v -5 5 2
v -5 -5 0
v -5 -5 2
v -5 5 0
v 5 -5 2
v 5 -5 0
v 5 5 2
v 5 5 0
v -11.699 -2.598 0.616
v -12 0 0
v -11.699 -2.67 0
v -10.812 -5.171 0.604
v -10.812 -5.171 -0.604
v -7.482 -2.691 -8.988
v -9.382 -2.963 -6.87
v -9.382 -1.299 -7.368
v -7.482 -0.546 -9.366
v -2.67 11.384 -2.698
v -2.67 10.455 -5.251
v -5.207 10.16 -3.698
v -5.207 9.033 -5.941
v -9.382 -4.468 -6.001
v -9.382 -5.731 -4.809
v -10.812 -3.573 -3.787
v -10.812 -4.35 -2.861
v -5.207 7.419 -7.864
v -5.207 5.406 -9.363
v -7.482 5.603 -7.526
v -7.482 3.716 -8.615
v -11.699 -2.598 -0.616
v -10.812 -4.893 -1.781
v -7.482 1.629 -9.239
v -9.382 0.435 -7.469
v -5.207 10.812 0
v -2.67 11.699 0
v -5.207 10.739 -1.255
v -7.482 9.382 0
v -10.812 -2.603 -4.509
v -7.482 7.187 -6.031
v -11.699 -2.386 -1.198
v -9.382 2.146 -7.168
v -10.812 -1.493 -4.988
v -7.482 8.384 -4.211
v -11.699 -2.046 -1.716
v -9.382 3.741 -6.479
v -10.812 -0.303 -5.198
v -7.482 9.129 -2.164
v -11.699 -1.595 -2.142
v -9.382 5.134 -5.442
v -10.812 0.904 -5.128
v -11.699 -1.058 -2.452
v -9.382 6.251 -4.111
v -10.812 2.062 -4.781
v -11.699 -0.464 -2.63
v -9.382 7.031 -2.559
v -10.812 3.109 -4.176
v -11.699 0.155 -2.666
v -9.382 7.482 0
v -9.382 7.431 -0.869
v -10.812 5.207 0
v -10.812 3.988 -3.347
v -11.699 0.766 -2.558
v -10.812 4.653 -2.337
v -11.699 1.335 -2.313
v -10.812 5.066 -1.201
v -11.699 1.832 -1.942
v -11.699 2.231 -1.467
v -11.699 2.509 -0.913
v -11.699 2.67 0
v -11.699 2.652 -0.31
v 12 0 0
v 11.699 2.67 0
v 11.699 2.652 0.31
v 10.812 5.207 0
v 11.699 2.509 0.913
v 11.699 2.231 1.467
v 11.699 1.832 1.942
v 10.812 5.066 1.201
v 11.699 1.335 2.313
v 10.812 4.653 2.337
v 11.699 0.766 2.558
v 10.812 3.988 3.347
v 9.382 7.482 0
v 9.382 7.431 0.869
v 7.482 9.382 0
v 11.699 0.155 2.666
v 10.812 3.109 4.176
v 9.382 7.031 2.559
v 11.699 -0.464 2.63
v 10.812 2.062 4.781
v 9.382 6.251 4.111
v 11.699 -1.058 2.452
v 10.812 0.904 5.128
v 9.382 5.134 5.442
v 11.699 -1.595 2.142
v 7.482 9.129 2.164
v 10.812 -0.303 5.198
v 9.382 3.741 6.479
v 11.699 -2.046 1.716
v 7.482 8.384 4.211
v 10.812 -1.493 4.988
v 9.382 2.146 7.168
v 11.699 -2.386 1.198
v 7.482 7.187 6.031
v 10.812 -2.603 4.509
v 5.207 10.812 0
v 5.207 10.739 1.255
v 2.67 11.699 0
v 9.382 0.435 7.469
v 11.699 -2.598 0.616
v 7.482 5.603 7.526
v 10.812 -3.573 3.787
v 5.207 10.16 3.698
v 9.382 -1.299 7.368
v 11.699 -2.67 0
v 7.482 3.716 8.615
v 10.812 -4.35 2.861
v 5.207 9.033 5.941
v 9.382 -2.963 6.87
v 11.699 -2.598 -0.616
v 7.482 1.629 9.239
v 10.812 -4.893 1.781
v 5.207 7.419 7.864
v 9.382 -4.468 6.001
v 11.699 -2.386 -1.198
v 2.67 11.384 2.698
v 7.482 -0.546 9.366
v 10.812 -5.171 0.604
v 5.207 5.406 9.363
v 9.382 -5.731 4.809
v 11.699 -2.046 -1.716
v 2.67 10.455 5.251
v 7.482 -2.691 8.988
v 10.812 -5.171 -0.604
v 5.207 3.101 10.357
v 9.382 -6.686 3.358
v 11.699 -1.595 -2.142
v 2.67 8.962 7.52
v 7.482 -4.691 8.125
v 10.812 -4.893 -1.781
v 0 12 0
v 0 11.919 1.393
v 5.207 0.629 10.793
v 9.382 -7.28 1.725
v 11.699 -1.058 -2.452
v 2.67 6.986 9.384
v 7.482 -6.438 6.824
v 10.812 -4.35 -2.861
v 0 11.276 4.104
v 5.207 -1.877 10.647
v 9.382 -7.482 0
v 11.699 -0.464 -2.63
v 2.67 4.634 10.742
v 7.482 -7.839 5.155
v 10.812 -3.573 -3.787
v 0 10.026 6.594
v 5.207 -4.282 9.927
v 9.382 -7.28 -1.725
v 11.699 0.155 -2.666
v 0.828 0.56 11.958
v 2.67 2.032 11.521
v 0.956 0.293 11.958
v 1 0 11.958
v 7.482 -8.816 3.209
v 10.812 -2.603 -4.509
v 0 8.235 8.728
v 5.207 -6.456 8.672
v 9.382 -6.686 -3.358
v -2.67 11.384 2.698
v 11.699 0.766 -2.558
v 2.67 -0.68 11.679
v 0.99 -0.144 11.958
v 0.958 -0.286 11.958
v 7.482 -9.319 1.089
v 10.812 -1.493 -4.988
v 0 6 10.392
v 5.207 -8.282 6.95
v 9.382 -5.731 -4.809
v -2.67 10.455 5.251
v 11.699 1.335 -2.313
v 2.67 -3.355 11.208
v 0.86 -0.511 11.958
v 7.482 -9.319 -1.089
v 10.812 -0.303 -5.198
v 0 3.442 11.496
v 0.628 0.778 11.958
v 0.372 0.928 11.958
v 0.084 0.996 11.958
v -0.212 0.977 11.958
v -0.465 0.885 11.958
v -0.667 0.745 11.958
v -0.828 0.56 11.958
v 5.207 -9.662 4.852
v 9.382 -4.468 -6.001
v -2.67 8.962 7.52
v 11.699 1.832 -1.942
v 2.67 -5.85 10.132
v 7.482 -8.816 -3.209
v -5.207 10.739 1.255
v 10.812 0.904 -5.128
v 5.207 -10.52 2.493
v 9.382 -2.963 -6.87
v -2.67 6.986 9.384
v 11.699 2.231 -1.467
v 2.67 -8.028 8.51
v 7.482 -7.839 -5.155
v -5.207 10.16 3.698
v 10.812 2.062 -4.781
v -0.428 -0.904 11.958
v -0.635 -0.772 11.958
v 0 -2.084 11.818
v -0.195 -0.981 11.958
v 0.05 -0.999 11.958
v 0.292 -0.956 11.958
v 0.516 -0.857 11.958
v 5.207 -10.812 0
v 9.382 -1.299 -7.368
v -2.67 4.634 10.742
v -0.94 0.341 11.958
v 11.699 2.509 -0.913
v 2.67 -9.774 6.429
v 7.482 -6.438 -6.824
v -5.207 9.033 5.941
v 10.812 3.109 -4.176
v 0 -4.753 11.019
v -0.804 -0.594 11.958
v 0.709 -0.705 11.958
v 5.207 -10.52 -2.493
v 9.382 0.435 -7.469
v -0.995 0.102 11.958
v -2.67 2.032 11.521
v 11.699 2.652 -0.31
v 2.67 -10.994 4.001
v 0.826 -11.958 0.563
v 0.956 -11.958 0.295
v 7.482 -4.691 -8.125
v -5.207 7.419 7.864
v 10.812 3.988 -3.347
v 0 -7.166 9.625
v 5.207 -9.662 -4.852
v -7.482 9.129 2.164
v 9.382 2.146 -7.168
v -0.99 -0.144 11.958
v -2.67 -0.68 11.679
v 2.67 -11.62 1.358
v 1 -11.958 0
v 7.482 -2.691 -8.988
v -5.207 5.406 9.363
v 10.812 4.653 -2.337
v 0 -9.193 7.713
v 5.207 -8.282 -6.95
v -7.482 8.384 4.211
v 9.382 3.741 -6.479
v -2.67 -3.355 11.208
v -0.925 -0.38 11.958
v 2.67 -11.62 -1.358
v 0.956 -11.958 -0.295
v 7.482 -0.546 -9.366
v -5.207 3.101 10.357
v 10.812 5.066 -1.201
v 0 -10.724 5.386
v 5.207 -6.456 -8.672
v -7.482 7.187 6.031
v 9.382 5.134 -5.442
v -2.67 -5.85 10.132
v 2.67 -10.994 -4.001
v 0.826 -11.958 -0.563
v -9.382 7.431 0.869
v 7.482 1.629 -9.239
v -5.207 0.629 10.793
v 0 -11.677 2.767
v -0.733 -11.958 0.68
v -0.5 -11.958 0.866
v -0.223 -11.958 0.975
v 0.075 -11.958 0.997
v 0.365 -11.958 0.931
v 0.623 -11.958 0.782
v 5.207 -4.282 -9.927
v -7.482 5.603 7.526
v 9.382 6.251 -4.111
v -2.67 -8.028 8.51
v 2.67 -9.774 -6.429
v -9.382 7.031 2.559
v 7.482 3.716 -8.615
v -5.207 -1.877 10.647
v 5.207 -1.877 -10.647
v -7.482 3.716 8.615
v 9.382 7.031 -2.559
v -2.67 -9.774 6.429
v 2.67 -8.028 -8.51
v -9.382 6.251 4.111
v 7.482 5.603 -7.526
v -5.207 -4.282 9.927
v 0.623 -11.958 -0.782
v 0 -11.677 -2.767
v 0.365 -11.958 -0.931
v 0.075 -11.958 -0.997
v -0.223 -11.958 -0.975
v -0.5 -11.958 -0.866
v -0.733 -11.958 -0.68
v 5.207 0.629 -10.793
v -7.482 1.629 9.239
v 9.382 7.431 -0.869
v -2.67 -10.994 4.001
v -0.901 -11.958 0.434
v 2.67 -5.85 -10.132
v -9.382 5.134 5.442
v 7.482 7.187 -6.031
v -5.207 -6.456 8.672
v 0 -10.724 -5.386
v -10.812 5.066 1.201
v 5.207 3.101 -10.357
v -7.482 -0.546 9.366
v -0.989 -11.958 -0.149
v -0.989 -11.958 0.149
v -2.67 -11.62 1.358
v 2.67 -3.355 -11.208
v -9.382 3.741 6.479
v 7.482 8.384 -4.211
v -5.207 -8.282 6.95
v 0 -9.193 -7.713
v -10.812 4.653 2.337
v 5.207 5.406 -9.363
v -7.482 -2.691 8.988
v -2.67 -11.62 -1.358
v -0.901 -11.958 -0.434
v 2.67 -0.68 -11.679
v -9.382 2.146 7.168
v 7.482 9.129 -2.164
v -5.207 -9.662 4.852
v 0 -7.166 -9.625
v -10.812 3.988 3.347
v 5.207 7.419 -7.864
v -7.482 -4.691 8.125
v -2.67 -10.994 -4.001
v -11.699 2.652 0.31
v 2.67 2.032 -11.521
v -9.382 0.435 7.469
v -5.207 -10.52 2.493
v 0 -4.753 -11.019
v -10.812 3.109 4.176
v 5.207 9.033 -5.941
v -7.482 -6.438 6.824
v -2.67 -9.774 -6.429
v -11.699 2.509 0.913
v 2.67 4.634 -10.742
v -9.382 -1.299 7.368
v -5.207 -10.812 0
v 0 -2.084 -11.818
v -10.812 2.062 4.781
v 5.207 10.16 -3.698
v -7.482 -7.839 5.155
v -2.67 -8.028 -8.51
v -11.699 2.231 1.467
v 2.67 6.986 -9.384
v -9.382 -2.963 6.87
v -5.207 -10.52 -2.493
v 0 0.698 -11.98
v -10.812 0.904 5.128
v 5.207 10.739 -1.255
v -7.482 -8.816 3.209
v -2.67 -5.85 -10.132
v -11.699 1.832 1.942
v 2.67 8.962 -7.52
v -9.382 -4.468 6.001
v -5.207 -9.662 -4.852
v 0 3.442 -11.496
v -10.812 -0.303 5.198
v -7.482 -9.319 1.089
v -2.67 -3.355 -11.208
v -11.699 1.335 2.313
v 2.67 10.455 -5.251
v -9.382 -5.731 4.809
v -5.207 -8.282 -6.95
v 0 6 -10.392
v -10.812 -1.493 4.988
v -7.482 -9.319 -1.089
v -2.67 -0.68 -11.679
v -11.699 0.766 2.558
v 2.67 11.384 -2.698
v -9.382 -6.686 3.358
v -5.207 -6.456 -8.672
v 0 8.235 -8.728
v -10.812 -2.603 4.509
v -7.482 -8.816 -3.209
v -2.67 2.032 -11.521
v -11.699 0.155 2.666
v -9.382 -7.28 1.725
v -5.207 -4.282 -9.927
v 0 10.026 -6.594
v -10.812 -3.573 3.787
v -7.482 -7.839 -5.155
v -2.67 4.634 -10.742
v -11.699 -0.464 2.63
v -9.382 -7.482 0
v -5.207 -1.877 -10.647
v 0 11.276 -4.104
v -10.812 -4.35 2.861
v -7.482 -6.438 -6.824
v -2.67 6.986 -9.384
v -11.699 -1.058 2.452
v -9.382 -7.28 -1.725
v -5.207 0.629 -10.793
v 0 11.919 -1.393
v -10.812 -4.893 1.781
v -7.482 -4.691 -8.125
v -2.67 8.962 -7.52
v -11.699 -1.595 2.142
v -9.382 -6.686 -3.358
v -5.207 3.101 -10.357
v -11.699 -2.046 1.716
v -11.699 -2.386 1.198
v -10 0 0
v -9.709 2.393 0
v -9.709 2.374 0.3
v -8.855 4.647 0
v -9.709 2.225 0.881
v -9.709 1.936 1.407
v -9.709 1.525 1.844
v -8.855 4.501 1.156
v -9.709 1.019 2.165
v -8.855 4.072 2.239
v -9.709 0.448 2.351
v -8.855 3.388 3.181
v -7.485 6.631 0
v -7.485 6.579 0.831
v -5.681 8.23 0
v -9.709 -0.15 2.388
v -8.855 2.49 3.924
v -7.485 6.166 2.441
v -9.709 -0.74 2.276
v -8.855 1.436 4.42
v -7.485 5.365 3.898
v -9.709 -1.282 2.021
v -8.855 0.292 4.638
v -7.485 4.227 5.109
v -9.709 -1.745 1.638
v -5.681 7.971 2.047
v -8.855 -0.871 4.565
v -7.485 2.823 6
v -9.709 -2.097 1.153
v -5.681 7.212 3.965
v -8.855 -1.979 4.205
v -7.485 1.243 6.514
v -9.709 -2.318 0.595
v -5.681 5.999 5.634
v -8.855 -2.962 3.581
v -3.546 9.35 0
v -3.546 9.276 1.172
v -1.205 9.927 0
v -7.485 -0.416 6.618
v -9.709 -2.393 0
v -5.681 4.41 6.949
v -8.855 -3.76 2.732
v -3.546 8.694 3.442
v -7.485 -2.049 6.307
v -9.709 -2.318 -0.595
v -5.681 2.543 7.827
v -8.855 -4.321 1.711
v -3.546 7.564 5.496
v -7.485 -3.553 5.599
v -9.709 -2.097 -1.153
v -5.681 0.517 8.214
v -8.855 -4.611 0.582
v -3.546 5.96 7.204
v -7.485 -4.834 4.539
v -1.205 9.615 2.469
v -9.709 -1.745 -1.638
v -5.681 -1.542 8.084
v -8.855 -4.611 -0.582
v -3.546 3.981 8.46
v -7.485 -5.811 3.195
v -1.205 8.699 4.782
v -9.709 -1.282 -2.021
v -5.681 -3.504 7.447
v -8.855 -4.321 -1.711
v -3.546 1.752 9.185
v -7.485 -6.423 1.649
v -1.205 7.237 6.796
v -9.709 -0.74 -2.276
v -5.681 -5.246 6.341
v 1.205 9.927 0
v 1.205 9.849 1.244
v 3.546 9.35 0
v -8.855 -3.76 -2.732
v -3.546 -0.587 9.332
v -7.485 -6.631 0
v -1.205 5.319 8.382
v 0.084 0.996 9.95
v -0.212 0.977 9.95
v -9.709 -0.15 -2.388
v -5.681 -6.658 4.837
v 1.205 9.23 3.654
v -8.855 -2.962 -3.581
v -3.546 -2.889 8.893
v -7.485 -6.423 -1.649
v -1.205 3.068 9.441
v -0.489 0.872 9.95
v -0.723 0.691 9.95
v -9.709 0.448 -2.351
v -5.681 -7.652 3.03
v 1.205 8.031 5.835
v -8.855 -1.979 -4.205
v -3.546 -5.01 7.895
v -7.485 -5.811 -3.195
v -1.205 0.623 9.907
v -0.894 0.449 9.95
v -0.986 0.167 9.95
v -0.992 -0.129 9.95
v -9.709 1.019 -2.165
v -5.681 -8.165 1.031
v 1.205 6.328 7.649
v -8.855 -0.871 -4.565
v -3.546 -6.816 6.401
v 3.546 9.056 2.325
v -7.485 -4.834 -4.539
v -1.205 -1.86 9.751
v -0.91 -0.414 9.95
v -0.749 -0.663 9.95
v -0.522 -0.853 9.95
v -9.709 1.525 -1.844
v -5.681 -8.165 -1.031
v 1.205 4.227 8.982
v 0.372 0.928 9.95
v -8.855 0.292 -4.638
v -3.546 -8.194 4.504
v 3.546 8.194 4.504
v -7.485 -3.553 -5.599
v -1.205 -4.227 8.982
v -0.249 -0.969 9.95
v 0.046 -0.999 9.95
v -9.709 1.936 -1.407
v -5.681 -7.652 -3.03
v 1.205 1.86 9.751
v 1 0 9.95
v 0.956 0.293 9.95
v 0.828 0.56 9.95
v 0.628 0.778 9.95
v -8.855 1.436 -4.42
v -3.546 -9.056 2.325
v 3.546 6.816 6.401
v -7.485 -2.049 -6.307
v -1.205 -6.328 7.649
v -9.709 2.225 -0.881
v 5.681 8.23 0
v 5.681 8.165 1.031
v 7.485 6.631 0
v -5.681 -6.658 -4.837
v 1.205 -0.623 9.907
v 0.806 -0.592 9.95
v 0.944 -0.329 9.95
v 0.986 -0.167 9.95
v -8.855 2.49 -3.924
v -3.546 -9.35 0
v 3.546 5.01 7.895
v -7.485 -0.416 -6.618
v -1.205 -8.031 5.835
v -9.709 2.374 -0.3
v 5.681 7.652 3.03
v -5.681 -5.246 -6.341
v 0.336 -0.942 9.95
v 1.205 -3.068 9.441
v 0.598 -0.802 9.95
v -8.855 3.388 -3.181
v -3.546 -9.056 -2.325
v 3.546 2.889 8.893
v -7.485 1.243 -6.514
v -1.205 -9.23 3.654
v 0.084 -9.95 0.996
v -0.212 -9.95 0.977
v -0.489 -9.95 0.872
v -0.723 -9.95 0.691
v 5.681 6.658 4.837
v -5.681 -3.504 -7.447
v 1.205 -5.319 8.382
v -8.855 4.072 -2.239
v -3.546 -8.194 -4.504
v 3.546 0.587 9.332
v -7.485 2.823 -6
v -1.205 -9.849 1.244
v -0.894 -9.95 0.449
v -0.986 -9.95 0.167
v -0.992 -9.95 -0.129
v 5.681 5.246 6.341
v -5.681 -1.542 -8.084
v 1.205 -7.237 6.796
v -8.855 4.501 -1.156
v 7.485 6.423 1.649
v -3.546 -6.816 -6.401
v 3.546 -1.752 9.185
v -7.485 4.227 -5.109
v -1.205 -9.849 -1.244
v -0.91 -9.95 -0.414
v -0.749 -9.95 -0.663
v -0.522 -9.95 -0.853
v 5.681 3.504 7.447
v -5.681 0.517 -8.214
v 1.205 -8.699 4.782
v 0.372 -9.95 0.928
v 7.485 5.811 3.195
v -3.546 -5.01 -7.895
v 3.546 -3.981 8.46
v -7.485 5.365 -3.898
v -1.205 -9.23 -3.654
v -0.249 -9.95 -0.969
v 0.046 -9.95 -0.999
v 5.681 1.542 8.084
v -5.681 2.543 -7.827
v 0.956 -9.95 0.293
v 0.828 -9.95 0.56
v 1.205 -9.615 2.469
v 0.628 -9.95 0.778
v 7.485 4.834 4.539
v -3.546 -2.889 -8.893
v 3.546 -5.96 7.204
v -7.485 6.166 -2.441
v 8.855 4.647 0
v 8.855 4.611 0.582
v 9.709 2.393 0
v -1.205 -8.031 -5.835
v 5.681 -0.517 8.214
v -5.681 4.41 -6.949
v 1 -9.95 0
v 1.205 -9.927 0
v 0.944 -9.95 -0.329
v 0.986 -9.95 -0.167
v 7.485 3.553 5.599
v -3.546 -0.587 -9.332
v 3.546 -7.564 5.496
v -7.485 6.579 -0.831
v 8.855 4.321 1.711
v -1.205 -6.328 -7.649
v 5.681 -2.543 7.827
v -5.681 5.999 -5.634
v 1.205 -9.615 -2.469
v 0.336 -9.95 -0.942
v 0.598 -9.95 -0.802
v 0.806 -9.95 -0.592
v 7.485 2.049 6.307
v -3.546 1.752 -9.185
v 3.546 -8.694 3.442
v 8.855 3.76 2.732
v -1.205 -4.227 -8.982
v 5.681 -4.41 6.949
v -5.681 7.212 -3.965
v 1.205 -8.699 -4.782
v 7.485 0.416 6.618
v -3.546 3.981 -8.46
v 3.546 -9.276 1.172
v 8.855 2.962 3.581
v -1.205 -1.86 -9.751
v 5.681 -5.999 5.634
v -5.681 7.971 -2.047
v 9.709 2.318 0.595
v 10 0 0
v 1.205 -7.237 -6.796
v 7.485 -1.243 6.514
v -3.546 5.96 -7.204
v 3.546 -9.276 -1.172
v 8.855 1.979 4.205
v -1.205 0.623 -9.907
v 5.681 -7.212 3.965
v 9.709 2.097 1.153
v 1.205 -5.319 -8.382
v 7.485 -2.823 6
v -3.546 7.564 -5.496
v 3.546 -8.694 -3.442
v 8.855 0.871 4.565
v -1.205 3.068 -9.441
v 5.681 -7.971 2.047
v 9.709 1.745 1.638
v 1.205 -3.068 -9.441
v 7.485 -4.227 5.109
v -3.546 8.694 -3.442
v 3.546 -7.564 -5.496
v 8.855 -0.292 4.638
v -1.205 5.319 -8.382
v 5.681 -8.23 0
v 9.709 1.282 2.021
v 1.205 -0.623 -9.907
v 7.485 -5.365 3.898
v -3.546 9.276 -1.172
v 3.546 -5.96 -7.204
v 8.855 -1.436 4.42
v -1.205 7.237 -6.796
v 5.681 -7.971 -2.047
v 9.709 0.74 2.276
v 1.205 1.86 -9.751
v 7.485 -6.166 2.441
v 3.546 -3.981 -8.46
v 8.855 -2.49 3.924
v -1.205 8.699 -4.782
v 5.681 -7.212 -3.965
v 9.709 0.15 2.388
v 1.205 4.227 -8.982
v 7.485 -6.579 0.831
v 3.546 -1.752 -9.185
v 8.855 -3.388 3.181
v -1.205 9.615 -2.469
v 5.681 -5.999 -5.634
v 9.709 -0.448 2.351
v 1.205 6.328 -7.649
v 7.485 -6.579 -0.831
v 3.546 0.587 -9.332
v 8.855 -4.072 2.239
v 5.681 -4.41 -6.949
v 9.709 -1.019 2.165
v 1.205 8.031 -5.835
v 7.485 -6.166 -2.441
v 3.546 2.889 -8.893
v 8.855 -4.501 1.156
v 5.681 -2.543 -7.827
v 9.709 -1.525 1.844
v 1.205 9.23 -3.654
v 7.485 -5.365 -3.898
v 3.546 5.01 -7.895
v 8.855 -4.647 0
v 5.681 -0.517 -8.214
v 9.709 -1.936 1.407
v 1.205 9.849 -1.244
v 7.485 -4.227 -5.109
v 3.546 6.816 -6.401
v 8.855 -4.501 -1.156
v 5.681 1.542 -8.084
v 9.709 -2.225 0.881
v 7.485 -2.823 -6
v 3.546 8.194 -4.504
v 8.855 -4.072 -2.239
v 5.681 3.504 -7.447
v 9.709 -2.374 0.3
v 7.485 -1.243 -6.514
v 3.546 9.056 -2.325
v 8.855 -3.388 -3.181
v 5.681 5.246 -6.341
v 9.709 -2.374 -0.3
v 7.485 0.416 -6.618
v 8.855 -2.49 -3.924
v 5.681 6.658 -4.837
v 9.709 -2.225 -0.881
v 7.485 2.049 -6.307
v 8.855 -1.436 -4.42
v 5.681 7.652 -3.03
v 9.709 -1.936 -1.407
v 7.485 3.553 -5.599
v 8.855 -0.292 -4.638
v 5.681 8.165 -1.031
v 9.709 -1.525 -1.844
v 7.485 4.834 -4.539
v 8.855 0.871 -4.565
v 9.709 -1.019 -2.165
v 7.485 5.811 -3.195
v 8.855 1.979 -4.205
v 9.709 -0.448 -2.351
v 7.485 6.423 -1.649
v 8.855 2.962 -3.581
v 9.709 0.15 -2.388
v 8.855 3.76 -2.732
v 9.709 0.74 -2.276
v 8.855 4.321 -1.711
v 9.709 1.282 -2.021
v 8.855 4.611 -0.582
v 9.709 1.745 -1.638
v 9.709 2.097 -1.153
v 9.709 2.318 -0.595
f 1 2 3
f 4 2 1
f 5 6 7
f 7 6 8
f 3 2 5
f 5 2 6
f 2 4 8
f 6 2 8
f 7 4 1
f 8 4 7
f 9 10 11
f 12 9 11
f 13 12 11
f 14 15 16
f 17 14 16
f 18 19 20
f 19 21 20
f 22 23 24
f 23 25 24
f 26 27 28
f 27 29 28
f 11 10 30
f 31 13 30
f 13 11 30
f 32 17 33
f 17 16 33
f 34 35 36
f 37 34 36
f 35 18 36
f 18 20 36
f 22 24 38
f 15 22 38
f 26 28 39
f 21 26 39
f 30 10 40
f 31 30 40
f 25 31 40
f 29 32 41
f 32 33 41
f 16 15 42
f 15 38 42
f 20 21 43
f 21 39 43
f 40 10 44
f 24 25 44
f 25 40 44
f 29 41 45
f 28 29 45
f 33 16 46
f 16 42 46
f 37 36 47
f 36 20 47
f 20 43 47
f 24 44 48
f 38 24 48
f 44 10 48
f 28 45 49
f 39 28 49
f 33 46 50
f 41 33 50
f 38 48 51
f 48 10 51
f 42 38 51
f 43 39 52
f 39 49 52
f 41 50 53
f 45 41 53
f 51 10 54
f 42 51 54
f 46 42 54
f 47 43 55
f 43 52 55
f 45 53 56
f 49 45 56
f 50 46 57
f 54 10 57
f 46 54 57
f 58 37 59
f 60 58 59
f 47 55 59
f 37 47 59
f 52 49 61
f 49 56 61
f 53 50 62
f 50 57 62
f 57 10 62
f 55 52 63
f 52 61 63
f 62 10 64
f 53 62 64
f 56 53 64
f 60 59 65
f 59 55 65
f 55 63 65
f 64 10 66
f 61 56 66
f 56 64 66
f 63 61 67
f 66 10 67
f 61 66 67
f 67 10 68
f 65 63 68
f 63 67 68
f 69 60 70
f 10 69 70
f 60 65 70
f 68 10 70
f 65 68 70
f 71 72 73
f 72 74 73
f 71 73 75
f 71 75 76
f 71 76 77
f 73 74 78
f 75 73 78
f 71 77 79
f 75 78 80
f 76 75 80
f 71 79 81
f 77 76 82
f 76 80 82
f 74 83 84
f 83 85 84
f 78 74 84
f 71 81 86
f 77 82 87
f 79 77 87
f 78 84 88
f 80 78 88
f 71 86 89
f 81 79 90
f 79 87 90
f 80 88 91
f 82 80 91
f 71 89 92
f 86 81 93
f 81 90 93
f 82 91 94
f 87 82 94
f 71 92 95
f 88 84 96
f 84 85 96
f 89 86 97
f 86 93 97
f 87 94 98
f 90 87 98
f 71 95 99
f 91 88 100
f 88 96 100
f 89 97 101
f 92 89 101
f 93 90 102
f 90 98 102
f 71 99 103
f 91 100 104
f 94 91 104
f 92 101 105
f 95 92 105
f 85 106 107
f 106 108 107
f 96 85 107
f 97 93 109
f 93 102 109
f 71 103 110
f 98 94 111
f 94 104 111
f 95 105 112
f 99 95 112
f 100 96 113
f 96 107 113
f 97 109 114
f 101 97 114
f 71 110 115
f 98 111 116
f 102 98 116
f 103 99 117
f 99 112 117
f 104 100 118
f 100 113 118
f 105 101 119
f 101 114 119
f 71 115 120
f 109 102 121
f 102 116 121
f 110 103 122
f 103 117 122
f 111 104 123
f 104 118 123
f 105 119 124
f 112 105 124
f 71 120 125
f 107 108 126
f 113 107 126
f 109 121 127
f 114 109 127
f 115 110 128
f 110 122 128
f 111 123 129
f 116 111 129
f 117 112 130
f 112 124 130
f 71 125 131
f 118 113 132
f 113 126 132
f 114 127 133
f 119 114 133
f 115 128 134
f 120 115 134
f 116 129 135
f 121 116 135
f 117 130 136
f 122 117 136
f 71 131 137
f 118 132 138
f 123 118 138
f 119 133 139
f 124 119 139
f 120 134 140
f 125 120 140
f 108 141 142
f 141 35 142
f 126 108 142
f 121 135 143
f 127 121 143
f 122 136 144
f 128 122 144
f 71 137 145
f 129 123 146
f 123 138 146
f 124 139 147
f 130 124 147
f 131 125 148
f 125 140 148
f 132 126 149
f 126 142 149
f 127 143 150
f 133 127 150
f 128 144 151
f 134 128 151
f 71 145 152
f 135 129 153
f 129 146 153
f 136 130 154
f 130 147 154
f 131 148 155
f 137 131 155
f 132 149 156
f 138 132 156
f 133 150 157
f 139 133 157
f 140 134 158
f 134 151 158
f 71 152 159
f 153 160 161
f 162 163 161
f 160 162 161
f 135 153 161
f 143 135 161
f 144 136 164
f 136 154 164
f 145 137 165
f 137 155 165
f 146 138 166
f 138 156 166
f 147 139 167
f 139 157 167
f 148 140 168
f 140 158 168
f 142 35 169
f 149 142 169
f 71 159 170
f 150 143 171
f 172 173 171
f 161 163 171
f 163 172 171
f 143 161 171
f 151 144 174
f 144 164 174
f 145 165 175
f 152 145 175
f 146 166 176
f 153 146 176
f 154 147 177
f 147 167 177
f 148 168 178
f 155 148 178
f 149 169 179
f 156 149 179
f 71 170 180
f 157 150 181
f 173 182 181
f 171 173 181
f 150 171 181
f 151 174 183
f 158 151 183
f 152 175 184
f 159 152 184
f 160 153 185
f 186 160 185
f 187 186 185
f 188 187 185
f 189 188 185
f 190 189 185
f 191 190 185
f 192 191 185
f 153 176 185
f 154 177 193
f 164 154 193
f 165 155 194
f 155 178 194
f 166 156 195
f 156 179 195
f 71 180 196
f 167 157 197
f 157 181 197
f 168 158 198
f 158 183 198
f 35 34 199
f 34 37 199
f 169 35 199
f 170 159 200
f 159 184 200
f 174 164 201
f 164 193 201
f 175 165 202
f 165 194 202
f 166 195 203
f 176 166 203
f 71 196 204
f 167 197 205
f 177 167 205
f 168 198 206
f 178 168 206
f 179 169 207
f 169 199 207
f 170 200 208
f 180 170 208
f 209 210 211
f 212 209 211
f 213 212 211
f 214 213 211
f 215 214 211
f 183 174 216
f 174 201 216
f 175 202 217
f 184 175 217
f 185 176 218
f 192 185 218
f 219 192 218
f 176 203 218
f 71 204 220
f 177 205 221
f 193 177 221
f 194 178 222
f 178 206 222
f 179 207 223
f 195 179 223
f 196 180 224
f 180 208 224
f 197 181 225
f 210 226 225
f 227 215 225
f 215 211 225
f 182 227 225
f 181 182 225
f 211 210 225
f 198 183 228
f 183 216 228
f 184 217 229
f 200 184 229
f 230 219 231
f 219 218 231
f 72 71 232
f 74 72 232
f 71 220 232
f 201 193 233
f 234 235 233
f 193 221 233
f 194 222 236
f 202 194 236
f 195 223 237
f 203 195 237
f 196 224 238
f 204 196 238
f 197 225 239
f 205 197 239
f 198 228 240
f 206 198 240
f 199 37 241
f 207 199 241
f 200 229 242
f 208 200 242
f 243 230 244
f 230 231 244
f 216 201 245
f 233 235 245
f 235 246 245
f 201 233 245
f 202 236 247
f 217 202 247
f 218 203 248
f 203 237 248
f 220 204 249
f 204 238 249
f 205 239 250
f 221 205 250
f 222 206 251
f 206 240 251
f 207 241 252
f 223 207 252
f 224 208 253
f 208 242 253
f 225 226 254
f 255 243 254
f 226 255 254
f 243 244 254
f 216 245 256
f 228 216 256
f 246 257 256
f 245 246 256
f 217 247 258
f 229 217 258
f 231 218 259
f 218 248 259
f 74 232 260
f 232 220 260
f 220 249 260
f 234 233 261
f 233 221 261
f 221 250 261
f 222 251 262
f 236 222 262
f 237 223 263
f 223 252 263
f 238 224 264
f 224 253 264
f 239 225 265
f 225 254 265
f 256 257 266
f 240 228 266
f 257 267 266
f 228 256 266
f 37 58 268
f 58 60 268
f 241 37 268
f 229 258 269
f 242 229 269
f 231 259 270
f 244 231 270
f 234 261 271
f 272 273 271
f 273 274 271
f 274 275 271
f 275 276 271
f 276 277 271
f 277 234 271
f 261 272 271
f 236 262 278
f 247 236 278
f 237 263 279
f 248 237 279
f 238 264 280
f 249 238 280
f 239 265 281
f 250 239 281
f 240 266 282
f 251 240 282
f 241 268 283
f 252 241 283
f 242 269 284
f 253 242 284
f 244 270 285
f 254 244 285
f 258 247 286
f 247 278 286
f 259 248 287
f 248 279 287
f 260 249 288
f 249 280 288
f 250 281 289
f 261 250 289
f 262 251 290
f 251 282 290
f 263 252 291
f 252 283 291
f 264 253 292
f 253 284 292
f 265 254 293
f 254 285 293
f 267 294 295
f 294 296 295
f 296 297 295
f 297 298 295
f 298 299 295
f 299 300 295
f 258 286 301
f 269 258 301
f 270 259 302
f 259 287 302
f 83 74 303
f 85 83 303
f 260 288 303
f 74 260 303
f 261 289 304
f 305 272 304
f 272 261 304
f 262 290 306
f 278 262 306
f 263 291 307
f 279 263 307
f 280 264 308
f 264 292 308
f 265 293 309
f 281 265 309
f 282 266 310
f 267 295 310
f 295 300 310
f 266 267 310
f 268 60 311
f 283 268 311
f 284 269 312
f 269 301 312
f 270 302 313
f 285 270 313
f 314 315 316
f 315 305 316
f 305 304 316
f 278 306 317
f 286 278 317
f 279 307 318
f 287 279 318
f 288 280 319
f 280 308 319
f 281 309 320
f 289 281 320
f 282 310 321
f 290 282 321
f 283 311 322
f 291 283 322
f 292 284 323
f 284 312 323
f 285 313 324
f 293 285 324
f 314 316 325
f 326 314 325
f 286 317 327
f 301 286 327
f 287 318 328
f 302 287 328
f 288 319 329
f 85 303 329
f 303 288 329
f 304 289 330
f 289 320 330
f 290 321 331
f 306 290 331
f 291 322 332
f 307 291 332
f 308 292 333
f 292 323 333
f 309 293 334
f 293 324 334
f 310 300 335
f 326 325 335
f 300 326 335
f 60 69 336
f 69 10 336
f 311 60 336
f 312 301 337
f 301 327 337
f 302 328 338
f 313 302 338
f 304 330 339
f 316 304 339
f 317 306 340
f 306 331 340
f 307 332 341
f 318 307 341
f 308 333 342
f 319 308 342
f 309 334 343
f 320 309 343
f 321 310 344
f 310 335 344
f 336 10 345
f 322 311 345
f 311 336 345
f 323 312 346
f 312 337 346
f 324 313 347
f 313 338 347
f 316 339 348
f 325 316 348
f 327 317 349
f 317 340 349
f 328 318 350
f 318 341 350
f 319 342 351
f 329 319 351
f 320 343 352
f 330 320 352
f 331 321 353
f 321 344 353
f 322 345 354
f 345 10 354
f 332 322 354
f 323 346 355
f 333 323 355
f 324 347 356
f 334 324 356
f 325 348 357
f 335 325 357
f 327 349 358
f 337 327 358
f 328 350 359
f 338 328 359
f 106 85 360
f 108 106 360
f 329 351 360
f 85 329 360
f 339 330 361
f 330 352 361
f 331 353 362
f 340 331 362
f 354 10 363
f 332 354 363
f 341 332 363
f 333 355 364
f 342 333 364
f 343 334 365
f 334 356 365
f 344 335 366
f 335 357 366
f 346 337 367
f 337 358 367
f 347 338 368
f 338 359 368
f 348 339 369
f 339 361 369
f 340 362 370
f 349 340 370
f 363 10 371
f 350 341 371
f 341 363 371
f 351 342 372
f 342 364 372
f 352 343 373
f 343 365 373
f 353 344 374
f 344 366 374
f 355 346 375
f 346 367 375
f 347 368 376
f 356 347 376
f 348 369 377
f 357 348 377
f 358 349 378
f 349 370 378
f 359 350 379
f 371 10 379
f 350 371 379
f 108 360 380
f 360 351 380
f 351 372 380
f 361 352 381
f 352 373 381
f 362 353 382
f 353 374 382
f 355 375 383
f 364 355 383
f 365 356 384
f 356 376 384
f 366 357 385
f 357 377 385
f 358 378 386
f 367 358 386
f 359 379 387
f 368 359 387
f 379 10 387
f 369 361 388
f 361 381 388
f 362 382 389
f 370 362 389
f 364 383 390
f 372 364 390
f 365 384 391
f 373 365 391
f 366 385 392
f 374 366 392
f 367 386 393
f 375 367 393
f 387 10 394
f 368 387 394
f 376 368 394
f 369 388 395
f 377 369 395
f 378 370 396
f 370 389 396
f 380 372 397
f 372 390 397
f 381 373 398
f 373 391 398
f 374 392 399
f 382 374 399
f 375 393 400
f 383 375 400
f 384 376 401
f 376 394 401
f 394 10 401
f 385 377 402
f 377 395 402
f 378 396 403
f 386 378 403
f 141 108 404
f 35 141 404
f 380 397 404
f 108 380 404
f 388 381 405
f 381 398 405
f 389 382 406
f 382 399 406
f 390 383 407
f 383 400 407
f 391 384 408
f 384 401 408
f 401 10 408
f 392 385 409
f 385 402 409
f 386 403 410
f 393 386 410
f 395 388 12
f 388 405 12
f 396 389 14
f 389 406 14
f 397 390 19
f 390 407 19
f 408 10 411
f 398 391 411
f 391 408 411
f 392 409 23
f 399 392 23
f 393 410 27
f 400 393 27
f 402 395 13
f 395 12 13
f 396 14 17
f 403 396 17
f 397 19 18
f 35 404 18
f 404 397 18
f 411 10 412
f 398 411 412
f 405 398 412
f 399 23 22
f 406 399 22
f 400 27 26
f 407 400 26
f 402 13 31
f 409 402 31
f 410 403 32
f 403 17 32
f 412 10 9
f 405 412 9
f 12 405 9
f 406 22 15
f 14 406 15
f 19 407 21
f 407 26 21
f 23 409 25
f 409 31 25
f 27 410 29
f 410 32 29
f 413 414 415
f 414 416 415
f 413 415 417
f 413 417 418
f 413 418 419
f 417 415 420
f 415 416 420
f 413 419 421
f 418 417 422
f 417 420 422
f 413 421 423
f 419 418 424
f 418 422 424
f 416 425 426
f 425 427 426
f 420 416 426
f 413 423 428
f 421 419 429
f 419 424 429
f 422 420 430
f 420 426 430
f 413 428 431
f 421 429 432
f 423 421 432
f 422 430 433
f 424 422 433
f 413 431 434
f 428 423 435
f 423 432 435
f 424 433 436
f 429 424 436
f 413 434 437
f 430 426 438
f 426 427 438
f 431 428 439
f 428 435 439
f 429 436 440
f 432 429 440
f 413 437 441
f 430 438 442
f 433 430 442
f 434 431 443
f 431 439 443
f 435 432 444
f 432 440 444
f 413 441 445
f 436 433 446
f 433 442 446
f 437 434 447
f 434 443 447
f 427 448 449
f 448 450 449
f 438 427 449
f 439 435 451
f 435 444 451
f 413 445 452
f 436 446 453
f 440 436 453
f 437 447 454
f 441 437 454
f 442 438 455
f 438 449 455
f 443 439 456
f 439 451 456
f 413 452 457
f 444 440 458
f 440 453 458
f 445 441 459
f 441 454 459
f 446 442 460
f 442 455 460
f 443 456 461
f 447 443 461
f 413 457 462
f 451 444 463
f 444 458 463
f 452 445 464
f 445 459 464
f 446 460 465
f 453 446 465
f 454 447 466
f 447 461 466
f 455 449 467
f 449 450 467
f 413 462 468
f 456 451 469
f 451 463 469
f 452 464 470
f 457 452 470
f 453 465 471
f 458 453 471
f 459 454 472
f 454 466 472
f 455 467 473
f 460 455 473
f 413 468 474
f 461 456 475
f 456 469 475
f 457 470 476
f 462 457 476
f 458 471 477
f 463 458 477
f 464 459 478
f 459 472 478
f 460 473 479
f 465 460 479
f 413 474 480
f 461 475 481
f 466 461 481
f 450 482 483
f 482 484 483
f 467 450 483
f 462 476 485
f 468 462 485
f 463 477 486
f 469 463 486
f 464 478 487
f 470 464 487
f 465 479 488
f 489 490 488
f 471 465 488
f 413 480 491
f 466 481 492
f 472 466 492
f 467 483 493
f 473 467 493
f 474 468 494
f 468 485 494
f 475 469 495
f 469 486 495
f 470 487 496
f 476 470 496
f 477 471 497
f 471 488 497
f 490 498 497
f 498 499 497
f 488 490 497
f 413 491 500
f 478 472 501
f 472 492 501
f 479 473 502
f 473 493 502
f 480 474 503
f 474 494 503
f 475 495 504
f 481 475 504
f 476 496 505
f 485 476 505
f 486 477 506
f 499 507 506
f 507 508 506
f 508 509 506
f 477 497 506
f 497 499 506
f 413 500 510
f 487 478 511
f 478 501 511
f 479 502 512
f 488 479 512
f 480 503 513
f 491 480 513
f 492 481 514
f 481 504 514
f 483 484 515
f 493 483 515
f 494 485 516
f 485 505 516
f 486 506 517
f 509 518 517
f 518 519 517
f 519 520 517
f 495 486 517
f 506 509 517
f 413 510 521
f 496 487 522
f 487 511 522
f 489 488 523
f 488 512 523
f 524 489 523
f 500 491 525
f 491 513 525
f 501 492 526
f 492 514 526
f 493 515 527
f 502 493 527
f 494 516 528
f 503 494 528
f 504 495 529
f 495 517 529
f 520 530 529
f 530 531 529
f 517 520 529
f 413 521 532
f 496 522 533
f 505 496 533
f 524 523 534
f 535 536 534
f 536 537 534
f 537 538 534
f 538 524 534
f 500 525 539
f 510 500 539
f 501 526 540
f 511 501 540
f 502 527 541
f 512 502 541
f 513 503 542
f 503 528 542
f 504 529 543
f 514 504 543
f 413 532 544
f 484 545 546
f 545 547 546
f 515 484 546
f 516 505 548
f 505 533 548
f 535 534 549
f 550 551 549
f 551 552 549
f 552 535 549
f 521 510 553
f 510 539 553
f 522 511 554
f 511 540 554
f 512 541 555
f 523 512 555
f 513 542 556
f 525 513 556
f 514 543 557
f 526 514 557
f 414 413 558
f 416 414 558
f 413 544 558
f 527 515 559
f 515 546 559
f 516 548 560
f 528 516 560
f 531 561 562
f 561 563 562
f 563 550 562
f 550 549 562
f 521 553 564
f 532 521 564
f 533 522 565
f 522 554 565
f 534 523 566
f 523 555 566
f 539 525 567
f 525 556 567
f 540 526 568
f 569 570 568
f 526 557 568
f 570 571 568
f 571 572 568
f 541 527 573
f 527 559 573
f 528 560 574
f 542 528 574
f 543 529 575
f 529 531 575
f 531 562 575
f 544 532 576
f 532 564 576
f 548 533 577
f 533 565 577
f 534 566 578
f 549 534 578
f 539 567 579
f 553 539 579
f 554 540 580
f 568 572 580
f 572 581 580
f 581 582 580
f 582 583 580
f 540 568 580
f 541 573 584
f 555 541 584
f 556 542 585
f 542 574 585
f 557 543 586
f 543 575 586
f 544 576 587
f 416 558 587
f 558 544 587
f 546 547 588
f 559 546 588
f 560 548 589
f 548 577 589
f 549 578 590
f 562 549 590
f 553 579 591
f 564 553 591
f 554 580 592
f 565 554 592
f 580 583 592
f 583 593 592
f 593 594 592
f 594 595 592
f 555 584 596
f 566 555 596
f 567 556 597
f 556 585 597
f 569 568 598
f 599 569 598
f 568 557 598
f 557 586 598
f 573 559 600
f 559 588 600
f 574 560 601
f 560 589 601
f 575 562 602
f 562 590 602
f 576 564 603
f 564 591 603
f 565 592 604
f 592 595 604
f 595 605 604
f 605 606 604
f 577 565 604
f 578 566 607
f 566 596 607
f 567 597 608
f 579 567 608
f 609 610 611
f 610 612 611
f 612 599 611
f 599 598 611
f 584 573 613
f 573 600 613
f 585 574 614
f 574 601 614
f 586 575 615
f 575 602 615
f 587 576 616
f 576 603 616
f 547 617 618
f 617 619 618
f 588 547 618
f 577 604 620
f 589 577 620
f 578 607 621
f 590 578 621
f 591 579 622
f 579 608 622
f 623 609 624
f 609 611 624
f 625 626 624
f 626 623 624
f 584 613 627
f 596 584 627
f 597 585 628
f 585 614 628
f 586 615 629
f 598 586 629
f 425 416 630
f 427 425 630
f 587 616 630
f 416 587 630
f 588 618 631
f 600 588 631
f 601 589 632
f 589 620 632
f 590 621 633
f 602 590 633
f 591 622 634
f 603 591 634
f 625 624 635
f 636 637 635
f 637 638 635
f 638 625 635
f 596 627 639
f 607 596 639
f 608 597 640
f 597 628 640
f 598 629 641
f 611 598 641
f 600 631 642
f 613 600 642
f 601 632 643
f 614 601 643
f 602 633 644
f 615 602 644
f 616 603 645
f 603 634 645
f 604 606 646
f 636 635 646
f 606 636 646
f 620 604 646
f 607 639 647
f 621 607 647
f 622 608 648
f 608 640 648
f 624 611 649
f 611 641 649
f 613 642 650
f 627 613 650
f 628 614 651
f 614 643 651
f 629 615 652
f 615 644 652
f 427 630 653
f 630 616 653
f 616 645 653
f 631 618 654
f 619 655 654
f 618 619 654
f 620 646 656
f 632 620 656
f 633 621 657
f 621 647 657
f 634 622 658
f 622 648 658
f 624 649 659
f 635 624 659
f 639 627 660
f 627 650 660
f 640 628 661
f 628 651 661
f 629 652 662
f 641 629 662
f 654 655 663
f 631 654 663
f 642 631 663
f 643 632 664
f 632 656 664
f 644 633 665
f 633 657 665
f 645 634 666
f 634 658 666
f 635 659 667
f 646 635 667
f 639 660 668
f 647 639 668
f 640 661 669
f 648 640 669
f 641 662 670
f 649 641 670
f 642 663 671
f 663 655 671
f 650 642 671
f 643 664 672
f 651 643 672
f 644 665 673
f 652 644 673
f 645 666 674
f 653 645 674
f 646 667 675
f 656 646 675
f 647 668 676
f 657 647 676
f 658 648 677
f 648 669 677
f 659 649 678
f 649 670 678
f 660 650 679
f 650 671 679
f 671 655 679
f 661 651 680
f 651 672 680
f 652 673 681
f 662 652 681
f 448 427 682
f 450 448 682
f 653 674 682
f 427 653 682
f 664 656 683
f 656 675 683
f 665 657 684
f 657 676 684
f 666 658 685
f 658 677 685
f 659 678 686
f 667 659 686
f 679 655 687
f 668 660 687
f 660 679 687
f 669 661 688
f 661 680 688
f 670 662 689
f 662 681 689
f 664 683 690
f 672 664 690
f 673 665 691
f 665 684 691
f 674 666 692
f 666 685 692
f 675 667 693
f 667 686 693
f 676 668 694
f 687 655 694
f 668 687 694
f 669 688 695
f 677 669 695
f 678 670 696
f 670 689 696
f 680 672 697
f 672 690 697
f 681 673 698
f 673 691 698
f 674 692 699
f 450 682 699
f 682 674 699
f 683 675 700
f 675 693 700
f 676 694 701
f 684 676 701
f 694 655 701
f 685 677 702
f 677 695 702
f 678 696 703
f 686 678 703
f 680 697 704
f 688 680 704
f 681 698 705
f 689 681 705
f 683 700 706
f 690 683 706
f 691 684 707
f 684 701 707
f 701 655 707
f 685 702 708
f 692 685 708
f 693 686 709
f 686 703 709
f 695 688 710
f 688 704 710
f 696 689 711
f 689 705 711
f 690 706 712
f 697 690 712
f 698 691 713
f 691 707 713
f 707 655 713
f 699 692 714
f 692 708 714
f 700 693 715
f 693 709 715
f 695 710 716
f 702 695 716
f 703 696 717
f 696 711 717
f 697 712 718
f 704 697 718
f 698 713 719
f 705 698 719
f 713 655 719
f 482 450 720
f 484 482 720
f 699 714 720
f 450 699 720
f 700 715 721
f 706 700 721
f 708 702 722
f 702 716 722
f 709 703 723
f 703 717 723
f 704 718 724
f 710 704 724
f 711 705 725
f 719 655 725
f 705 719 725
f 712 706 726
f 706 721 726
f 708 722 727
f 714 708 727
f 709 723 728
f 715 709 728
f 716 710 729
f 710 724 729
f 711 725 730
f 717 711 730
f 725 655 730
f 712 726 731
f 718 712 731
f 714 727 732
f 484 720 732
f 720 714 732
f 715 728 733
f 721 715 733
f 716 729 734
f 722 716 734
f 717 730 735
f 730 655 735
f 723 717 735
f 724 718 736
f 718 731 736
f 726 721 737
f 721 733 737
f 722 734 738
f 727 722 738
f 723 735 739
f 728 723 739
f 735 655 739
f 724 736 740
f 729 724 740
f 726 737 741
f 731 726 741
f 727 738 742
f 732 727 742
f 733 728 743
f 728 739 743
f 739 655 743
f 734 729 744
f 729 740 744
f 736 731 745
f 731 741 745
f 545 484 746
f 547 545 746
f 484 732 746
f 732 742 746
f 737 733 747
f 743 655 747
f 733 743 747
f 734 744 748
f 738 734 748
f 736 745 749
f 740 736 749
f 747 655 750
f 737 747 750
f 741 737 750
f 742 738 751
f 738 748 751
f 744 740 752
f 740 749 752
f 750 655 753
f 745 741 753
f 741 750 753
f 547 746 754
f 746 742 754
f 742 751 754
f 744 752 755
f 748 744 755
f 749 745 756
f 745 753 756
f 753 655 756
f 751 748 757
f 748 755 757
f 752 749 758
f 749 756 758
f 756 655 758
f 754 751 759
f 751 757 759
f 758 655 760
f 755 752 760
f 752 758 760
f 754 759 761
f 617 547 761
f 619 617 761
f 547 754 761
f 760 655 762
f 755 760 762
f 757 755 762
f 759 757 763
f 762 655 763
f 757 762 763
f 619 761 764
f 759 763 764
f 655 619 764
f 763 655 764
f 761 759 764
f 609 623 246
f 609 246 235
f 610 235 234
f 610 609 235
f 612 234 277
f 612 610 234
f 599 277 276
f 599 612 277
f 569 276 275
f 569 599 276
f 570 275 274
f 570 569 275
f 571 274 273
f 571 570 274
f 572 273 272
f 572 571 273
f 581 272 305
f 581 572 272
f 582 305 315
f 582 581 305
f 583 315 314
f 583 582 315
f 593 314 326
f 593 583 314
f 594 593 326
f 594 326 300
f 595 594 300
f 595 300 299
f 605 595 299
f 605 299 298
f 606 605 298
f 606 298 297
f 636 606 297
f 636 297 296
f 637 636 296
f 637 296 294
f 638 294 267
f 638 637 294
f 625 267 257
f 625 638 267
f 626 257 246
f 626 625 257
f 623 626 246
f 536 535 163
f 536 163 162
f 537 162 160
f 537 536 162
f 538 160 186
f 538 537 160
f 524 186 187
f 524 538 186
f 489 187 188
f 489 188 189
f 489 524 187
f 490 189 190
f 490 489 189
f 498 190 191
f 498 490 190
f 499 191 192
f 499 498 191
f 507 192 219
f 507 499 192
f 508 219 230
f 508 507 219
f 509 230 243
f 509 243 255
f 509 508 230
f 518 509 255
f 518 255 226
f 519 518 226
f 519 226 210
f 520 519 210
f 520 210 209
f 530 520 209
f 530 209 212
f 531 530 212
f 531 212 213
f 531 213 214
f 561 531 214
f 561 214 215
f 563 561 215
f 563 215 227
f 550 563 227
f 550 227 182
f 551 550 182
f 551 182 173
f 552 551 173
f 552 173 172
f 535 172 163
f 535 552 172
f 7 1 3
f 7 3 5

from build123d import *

# Parameters (mm, degrees)
F3_R      = 1
F4_DEPTH  = 200
F6_R      = 1
F7_DEPTH  = 25
F9_W      = 10
F9_H      = 10
F10_DEPTH = 2


with BuildPart() as f2:
    # F0 (on Top) → F2 (revolve)
    with BuildSketch(Plane.XY):
        with BuildLine():
            ThreePointArc((-10, 0), (0, 10), (10, 0))
            Line((10, 0), (12, 0))
            ThreePointArc((12, 0), (0, 12), (-12, 0))
            Line((-12, 0), (-10, 0))
        make_face()
    revolve(axis=Axis((34.508616, 0, 0), (1, 0, 0)))


with BuildPart() as f4:
    # F3 (on Top) → F4 (new body)
    with BuildSketch(Plane.XY):
        Circle(F3_R)
    extrude(amount=F4_DEPTH)


with BuildPart() as f2_1:
    add(f2.part)

    # F5: cut F4
    add(f4.part, mode=Mode.SUBTRACT)


with BuildPart() as f7:
    # F6 (on Front) → F7 (new body)
    with BuildSketch(Plane.XZ):
        Circle(F6_R)
    extrude(amount=F7_DEPTH)


with BuildPart() as f2_2:
    add(f2_1.part)

    # F8: cut F7
    add(f7.part, mode=Mode.SUBTRACT)


with BuildPart() as f10:
    # F9 (on Top) → F10 (new body)
    with BuildSketch(Plane.XY):
        Rectangle(F9_W, F9_H)
    extrude(amount=F10_DEPTH)


solid = Compound([f2_2.part, f10.part])
